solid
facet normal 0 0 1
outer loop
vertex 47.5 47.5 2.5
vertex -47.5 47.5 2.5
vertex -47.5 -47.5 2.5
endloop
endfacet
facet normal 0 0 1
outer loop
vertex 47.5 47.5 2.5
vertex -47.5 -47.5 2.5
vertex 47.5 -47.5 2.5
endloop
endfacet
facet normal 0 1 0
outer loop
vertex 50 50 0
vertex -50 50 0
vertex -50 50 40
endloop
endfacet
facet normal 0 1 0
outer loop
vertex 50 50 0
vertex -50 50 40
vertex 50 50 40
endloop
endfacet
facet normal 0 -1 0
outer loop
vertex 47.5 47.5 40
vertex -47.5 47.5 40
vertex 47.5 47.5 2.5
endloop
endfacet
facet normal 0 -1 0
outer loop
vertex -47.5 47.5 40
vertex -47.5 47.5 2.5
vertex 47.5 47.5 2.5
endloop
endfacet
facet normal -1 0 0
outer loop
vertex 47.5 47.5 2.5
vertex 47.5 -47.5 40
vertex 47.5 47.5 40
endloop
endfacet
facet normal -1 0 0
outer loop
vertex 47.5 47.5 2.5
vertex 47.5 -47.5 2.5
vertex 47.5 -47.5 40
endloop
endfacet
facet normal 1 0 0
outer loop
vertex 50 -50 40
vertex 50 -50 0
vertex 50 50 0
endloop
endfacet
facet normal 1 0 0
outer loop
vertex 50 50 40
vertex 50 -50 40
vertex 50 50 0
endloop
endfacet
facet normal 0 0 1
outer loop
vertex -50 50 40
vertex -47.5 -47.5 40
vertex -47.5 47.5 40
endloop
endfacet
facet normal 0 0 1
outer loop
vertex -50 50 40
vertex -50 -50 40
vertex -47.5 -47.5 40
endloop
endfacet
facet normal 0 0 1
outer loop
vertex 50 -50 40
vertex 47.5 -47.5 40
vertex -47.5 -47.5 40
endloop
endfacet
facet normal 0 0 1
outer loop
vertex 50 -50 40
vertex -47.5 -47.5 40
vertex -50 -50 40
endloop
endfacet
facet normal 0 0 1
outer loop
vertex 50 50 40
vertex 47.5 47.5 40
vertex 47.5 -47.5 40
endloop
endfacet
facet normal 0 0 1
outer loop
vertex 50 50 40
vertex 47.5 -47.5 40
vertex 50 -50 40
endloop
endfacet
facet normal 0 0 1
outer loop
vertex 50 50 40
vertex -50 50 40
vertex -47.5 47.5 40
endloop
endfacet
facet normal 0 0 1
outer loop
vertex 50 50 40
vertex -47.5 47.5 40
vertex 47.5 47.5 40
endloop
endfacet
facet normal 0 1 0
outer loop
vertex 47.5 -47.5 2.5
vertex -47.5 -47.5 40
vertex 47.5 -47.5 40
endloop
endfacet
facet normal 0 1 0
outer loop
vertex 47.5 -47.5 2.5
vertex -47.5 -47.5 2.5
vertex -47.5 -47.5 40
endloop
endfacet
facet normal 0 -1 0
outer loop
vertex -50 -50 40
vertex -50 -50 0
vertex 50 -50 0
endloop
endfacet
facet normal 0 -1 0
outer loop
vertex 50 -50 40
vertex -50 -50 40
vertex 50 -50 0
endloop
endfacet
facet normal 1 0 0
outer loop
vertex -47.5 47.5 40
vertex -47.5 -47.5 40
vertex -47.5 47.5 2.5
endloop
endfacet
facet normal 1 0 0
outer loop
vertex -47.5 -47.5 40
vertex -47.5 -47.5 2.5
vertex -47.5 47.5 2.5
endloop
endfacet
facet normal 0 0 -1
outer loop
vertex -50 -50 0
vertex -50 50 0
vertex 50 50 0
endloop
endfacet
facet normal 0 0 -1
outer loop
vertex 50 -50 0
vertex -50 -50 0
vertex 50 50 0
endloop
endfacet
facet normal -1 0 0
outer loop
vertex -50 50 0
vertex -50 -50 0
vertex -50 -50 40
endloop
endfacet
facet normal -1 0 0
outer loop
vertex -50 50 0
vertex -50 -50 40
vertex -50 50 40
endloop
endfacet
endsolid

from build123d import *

# Parameters (mm, degrees)
F0_W     = 100
F0_H     = 100
F1_DEPTH = 25
F2_T     = -2.5
F3_DEPTH = 40
F4_T     = -2.5


with BuildPart() as f1:
    # F0 (on Top) → F1 (new body)
    with BuildSketch(Plane.XY):
        Rectangle(F0_W, F0_H)
    extrude(amount=F1_DEPTH)

    # F2
    f2_openings = [f1.faces().sort_by_distance(p)[0] for p in [
        (0, 0, 25),
    ]]
    offset(amount=F2_T, openings=f2_openings)

    # F0 (on Top) → F3 (join)
    with BuildSketch(Plane.XY):
        Rectangle(F0_W, F0_H)
    extrude(amount=F3_DEPTH)

    # F4
    f4_openings = [f1.faces().sort_by_distance(p)[0] for p in [
        (0, 0, 40),
    ]]
    offset(amount=F4_T, openings=f4_openings)


solid = f1.part
